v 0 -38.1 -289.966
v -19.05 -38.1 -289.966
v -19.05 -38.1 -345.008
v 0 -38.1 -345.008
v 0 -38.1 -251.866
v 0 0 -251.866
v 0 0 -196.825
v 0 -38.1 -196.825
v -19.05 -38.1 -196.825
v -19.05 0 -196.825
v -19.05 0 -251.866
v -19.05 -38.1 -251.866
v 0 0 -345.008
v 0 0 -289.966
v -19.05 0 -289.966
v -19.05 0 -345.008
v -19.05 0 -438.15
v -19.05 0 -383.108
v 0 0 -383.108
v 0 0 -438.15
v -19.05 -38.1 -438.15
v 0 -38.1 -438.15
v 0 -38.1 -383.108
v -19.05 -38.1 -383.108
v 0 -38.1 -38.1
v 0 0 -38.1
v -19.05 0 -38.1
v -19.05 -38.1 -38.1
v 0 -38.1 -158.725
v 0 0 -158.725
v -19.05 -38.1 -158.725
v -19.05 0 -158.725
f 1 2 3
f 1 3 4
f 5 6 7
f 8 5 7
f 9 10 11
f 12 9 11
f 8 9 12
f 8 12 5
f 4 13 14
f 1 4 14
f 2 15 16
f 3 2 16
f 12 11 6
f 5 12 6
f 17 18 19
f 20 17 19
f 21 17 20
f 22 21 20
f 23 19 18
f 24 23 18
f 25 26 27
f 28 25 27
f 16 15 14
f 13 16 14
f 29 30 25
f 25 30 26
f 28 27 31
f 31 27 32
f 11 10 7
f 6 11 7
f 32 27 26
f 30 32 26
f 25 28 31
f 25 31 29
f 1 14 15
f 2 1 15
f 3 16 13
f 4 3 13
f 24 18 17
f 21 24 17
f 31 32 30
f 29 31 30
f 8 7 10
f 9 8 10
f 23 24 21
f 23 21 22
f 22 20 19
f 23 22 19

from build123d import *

# Parameters (mm, degrees)
F1_DEPTH = 38.1


with BuildPart() as f1:
    # F0 (on Front) → F1 (new body)
    with BuildSketch(Plane.XZ):
        Polygon((0, -158.7246), (0, -38.1), (-9.525, -38.1), (-19.05, -38.1), (-19.05, -158.7246), (-9.525, -158.7246), align=None)
        Polygon((0, -251.8664), (0, -196.8246), (-9.525, -196.8246), (-19.05, -196.8246), (-19.05, -251.8664), (-9.525, -251.8664), align=None)
        Polygon((0, -345.0082), (0, -289.9664), (-9.525, -289.9664), (-19.05, -289.9664), (-19.05, -345.0082), (-9.525, -345.0082), align=None)
        Polygon((0, -438.15), (0, -383.1082), (-9.525, -383.1082), (-19.05, -383.1082), (-19.05, -438.15), (-9.525, -438.15), align=None)
    extrude(amount=F1_DEPTH)


solid = f1.part
